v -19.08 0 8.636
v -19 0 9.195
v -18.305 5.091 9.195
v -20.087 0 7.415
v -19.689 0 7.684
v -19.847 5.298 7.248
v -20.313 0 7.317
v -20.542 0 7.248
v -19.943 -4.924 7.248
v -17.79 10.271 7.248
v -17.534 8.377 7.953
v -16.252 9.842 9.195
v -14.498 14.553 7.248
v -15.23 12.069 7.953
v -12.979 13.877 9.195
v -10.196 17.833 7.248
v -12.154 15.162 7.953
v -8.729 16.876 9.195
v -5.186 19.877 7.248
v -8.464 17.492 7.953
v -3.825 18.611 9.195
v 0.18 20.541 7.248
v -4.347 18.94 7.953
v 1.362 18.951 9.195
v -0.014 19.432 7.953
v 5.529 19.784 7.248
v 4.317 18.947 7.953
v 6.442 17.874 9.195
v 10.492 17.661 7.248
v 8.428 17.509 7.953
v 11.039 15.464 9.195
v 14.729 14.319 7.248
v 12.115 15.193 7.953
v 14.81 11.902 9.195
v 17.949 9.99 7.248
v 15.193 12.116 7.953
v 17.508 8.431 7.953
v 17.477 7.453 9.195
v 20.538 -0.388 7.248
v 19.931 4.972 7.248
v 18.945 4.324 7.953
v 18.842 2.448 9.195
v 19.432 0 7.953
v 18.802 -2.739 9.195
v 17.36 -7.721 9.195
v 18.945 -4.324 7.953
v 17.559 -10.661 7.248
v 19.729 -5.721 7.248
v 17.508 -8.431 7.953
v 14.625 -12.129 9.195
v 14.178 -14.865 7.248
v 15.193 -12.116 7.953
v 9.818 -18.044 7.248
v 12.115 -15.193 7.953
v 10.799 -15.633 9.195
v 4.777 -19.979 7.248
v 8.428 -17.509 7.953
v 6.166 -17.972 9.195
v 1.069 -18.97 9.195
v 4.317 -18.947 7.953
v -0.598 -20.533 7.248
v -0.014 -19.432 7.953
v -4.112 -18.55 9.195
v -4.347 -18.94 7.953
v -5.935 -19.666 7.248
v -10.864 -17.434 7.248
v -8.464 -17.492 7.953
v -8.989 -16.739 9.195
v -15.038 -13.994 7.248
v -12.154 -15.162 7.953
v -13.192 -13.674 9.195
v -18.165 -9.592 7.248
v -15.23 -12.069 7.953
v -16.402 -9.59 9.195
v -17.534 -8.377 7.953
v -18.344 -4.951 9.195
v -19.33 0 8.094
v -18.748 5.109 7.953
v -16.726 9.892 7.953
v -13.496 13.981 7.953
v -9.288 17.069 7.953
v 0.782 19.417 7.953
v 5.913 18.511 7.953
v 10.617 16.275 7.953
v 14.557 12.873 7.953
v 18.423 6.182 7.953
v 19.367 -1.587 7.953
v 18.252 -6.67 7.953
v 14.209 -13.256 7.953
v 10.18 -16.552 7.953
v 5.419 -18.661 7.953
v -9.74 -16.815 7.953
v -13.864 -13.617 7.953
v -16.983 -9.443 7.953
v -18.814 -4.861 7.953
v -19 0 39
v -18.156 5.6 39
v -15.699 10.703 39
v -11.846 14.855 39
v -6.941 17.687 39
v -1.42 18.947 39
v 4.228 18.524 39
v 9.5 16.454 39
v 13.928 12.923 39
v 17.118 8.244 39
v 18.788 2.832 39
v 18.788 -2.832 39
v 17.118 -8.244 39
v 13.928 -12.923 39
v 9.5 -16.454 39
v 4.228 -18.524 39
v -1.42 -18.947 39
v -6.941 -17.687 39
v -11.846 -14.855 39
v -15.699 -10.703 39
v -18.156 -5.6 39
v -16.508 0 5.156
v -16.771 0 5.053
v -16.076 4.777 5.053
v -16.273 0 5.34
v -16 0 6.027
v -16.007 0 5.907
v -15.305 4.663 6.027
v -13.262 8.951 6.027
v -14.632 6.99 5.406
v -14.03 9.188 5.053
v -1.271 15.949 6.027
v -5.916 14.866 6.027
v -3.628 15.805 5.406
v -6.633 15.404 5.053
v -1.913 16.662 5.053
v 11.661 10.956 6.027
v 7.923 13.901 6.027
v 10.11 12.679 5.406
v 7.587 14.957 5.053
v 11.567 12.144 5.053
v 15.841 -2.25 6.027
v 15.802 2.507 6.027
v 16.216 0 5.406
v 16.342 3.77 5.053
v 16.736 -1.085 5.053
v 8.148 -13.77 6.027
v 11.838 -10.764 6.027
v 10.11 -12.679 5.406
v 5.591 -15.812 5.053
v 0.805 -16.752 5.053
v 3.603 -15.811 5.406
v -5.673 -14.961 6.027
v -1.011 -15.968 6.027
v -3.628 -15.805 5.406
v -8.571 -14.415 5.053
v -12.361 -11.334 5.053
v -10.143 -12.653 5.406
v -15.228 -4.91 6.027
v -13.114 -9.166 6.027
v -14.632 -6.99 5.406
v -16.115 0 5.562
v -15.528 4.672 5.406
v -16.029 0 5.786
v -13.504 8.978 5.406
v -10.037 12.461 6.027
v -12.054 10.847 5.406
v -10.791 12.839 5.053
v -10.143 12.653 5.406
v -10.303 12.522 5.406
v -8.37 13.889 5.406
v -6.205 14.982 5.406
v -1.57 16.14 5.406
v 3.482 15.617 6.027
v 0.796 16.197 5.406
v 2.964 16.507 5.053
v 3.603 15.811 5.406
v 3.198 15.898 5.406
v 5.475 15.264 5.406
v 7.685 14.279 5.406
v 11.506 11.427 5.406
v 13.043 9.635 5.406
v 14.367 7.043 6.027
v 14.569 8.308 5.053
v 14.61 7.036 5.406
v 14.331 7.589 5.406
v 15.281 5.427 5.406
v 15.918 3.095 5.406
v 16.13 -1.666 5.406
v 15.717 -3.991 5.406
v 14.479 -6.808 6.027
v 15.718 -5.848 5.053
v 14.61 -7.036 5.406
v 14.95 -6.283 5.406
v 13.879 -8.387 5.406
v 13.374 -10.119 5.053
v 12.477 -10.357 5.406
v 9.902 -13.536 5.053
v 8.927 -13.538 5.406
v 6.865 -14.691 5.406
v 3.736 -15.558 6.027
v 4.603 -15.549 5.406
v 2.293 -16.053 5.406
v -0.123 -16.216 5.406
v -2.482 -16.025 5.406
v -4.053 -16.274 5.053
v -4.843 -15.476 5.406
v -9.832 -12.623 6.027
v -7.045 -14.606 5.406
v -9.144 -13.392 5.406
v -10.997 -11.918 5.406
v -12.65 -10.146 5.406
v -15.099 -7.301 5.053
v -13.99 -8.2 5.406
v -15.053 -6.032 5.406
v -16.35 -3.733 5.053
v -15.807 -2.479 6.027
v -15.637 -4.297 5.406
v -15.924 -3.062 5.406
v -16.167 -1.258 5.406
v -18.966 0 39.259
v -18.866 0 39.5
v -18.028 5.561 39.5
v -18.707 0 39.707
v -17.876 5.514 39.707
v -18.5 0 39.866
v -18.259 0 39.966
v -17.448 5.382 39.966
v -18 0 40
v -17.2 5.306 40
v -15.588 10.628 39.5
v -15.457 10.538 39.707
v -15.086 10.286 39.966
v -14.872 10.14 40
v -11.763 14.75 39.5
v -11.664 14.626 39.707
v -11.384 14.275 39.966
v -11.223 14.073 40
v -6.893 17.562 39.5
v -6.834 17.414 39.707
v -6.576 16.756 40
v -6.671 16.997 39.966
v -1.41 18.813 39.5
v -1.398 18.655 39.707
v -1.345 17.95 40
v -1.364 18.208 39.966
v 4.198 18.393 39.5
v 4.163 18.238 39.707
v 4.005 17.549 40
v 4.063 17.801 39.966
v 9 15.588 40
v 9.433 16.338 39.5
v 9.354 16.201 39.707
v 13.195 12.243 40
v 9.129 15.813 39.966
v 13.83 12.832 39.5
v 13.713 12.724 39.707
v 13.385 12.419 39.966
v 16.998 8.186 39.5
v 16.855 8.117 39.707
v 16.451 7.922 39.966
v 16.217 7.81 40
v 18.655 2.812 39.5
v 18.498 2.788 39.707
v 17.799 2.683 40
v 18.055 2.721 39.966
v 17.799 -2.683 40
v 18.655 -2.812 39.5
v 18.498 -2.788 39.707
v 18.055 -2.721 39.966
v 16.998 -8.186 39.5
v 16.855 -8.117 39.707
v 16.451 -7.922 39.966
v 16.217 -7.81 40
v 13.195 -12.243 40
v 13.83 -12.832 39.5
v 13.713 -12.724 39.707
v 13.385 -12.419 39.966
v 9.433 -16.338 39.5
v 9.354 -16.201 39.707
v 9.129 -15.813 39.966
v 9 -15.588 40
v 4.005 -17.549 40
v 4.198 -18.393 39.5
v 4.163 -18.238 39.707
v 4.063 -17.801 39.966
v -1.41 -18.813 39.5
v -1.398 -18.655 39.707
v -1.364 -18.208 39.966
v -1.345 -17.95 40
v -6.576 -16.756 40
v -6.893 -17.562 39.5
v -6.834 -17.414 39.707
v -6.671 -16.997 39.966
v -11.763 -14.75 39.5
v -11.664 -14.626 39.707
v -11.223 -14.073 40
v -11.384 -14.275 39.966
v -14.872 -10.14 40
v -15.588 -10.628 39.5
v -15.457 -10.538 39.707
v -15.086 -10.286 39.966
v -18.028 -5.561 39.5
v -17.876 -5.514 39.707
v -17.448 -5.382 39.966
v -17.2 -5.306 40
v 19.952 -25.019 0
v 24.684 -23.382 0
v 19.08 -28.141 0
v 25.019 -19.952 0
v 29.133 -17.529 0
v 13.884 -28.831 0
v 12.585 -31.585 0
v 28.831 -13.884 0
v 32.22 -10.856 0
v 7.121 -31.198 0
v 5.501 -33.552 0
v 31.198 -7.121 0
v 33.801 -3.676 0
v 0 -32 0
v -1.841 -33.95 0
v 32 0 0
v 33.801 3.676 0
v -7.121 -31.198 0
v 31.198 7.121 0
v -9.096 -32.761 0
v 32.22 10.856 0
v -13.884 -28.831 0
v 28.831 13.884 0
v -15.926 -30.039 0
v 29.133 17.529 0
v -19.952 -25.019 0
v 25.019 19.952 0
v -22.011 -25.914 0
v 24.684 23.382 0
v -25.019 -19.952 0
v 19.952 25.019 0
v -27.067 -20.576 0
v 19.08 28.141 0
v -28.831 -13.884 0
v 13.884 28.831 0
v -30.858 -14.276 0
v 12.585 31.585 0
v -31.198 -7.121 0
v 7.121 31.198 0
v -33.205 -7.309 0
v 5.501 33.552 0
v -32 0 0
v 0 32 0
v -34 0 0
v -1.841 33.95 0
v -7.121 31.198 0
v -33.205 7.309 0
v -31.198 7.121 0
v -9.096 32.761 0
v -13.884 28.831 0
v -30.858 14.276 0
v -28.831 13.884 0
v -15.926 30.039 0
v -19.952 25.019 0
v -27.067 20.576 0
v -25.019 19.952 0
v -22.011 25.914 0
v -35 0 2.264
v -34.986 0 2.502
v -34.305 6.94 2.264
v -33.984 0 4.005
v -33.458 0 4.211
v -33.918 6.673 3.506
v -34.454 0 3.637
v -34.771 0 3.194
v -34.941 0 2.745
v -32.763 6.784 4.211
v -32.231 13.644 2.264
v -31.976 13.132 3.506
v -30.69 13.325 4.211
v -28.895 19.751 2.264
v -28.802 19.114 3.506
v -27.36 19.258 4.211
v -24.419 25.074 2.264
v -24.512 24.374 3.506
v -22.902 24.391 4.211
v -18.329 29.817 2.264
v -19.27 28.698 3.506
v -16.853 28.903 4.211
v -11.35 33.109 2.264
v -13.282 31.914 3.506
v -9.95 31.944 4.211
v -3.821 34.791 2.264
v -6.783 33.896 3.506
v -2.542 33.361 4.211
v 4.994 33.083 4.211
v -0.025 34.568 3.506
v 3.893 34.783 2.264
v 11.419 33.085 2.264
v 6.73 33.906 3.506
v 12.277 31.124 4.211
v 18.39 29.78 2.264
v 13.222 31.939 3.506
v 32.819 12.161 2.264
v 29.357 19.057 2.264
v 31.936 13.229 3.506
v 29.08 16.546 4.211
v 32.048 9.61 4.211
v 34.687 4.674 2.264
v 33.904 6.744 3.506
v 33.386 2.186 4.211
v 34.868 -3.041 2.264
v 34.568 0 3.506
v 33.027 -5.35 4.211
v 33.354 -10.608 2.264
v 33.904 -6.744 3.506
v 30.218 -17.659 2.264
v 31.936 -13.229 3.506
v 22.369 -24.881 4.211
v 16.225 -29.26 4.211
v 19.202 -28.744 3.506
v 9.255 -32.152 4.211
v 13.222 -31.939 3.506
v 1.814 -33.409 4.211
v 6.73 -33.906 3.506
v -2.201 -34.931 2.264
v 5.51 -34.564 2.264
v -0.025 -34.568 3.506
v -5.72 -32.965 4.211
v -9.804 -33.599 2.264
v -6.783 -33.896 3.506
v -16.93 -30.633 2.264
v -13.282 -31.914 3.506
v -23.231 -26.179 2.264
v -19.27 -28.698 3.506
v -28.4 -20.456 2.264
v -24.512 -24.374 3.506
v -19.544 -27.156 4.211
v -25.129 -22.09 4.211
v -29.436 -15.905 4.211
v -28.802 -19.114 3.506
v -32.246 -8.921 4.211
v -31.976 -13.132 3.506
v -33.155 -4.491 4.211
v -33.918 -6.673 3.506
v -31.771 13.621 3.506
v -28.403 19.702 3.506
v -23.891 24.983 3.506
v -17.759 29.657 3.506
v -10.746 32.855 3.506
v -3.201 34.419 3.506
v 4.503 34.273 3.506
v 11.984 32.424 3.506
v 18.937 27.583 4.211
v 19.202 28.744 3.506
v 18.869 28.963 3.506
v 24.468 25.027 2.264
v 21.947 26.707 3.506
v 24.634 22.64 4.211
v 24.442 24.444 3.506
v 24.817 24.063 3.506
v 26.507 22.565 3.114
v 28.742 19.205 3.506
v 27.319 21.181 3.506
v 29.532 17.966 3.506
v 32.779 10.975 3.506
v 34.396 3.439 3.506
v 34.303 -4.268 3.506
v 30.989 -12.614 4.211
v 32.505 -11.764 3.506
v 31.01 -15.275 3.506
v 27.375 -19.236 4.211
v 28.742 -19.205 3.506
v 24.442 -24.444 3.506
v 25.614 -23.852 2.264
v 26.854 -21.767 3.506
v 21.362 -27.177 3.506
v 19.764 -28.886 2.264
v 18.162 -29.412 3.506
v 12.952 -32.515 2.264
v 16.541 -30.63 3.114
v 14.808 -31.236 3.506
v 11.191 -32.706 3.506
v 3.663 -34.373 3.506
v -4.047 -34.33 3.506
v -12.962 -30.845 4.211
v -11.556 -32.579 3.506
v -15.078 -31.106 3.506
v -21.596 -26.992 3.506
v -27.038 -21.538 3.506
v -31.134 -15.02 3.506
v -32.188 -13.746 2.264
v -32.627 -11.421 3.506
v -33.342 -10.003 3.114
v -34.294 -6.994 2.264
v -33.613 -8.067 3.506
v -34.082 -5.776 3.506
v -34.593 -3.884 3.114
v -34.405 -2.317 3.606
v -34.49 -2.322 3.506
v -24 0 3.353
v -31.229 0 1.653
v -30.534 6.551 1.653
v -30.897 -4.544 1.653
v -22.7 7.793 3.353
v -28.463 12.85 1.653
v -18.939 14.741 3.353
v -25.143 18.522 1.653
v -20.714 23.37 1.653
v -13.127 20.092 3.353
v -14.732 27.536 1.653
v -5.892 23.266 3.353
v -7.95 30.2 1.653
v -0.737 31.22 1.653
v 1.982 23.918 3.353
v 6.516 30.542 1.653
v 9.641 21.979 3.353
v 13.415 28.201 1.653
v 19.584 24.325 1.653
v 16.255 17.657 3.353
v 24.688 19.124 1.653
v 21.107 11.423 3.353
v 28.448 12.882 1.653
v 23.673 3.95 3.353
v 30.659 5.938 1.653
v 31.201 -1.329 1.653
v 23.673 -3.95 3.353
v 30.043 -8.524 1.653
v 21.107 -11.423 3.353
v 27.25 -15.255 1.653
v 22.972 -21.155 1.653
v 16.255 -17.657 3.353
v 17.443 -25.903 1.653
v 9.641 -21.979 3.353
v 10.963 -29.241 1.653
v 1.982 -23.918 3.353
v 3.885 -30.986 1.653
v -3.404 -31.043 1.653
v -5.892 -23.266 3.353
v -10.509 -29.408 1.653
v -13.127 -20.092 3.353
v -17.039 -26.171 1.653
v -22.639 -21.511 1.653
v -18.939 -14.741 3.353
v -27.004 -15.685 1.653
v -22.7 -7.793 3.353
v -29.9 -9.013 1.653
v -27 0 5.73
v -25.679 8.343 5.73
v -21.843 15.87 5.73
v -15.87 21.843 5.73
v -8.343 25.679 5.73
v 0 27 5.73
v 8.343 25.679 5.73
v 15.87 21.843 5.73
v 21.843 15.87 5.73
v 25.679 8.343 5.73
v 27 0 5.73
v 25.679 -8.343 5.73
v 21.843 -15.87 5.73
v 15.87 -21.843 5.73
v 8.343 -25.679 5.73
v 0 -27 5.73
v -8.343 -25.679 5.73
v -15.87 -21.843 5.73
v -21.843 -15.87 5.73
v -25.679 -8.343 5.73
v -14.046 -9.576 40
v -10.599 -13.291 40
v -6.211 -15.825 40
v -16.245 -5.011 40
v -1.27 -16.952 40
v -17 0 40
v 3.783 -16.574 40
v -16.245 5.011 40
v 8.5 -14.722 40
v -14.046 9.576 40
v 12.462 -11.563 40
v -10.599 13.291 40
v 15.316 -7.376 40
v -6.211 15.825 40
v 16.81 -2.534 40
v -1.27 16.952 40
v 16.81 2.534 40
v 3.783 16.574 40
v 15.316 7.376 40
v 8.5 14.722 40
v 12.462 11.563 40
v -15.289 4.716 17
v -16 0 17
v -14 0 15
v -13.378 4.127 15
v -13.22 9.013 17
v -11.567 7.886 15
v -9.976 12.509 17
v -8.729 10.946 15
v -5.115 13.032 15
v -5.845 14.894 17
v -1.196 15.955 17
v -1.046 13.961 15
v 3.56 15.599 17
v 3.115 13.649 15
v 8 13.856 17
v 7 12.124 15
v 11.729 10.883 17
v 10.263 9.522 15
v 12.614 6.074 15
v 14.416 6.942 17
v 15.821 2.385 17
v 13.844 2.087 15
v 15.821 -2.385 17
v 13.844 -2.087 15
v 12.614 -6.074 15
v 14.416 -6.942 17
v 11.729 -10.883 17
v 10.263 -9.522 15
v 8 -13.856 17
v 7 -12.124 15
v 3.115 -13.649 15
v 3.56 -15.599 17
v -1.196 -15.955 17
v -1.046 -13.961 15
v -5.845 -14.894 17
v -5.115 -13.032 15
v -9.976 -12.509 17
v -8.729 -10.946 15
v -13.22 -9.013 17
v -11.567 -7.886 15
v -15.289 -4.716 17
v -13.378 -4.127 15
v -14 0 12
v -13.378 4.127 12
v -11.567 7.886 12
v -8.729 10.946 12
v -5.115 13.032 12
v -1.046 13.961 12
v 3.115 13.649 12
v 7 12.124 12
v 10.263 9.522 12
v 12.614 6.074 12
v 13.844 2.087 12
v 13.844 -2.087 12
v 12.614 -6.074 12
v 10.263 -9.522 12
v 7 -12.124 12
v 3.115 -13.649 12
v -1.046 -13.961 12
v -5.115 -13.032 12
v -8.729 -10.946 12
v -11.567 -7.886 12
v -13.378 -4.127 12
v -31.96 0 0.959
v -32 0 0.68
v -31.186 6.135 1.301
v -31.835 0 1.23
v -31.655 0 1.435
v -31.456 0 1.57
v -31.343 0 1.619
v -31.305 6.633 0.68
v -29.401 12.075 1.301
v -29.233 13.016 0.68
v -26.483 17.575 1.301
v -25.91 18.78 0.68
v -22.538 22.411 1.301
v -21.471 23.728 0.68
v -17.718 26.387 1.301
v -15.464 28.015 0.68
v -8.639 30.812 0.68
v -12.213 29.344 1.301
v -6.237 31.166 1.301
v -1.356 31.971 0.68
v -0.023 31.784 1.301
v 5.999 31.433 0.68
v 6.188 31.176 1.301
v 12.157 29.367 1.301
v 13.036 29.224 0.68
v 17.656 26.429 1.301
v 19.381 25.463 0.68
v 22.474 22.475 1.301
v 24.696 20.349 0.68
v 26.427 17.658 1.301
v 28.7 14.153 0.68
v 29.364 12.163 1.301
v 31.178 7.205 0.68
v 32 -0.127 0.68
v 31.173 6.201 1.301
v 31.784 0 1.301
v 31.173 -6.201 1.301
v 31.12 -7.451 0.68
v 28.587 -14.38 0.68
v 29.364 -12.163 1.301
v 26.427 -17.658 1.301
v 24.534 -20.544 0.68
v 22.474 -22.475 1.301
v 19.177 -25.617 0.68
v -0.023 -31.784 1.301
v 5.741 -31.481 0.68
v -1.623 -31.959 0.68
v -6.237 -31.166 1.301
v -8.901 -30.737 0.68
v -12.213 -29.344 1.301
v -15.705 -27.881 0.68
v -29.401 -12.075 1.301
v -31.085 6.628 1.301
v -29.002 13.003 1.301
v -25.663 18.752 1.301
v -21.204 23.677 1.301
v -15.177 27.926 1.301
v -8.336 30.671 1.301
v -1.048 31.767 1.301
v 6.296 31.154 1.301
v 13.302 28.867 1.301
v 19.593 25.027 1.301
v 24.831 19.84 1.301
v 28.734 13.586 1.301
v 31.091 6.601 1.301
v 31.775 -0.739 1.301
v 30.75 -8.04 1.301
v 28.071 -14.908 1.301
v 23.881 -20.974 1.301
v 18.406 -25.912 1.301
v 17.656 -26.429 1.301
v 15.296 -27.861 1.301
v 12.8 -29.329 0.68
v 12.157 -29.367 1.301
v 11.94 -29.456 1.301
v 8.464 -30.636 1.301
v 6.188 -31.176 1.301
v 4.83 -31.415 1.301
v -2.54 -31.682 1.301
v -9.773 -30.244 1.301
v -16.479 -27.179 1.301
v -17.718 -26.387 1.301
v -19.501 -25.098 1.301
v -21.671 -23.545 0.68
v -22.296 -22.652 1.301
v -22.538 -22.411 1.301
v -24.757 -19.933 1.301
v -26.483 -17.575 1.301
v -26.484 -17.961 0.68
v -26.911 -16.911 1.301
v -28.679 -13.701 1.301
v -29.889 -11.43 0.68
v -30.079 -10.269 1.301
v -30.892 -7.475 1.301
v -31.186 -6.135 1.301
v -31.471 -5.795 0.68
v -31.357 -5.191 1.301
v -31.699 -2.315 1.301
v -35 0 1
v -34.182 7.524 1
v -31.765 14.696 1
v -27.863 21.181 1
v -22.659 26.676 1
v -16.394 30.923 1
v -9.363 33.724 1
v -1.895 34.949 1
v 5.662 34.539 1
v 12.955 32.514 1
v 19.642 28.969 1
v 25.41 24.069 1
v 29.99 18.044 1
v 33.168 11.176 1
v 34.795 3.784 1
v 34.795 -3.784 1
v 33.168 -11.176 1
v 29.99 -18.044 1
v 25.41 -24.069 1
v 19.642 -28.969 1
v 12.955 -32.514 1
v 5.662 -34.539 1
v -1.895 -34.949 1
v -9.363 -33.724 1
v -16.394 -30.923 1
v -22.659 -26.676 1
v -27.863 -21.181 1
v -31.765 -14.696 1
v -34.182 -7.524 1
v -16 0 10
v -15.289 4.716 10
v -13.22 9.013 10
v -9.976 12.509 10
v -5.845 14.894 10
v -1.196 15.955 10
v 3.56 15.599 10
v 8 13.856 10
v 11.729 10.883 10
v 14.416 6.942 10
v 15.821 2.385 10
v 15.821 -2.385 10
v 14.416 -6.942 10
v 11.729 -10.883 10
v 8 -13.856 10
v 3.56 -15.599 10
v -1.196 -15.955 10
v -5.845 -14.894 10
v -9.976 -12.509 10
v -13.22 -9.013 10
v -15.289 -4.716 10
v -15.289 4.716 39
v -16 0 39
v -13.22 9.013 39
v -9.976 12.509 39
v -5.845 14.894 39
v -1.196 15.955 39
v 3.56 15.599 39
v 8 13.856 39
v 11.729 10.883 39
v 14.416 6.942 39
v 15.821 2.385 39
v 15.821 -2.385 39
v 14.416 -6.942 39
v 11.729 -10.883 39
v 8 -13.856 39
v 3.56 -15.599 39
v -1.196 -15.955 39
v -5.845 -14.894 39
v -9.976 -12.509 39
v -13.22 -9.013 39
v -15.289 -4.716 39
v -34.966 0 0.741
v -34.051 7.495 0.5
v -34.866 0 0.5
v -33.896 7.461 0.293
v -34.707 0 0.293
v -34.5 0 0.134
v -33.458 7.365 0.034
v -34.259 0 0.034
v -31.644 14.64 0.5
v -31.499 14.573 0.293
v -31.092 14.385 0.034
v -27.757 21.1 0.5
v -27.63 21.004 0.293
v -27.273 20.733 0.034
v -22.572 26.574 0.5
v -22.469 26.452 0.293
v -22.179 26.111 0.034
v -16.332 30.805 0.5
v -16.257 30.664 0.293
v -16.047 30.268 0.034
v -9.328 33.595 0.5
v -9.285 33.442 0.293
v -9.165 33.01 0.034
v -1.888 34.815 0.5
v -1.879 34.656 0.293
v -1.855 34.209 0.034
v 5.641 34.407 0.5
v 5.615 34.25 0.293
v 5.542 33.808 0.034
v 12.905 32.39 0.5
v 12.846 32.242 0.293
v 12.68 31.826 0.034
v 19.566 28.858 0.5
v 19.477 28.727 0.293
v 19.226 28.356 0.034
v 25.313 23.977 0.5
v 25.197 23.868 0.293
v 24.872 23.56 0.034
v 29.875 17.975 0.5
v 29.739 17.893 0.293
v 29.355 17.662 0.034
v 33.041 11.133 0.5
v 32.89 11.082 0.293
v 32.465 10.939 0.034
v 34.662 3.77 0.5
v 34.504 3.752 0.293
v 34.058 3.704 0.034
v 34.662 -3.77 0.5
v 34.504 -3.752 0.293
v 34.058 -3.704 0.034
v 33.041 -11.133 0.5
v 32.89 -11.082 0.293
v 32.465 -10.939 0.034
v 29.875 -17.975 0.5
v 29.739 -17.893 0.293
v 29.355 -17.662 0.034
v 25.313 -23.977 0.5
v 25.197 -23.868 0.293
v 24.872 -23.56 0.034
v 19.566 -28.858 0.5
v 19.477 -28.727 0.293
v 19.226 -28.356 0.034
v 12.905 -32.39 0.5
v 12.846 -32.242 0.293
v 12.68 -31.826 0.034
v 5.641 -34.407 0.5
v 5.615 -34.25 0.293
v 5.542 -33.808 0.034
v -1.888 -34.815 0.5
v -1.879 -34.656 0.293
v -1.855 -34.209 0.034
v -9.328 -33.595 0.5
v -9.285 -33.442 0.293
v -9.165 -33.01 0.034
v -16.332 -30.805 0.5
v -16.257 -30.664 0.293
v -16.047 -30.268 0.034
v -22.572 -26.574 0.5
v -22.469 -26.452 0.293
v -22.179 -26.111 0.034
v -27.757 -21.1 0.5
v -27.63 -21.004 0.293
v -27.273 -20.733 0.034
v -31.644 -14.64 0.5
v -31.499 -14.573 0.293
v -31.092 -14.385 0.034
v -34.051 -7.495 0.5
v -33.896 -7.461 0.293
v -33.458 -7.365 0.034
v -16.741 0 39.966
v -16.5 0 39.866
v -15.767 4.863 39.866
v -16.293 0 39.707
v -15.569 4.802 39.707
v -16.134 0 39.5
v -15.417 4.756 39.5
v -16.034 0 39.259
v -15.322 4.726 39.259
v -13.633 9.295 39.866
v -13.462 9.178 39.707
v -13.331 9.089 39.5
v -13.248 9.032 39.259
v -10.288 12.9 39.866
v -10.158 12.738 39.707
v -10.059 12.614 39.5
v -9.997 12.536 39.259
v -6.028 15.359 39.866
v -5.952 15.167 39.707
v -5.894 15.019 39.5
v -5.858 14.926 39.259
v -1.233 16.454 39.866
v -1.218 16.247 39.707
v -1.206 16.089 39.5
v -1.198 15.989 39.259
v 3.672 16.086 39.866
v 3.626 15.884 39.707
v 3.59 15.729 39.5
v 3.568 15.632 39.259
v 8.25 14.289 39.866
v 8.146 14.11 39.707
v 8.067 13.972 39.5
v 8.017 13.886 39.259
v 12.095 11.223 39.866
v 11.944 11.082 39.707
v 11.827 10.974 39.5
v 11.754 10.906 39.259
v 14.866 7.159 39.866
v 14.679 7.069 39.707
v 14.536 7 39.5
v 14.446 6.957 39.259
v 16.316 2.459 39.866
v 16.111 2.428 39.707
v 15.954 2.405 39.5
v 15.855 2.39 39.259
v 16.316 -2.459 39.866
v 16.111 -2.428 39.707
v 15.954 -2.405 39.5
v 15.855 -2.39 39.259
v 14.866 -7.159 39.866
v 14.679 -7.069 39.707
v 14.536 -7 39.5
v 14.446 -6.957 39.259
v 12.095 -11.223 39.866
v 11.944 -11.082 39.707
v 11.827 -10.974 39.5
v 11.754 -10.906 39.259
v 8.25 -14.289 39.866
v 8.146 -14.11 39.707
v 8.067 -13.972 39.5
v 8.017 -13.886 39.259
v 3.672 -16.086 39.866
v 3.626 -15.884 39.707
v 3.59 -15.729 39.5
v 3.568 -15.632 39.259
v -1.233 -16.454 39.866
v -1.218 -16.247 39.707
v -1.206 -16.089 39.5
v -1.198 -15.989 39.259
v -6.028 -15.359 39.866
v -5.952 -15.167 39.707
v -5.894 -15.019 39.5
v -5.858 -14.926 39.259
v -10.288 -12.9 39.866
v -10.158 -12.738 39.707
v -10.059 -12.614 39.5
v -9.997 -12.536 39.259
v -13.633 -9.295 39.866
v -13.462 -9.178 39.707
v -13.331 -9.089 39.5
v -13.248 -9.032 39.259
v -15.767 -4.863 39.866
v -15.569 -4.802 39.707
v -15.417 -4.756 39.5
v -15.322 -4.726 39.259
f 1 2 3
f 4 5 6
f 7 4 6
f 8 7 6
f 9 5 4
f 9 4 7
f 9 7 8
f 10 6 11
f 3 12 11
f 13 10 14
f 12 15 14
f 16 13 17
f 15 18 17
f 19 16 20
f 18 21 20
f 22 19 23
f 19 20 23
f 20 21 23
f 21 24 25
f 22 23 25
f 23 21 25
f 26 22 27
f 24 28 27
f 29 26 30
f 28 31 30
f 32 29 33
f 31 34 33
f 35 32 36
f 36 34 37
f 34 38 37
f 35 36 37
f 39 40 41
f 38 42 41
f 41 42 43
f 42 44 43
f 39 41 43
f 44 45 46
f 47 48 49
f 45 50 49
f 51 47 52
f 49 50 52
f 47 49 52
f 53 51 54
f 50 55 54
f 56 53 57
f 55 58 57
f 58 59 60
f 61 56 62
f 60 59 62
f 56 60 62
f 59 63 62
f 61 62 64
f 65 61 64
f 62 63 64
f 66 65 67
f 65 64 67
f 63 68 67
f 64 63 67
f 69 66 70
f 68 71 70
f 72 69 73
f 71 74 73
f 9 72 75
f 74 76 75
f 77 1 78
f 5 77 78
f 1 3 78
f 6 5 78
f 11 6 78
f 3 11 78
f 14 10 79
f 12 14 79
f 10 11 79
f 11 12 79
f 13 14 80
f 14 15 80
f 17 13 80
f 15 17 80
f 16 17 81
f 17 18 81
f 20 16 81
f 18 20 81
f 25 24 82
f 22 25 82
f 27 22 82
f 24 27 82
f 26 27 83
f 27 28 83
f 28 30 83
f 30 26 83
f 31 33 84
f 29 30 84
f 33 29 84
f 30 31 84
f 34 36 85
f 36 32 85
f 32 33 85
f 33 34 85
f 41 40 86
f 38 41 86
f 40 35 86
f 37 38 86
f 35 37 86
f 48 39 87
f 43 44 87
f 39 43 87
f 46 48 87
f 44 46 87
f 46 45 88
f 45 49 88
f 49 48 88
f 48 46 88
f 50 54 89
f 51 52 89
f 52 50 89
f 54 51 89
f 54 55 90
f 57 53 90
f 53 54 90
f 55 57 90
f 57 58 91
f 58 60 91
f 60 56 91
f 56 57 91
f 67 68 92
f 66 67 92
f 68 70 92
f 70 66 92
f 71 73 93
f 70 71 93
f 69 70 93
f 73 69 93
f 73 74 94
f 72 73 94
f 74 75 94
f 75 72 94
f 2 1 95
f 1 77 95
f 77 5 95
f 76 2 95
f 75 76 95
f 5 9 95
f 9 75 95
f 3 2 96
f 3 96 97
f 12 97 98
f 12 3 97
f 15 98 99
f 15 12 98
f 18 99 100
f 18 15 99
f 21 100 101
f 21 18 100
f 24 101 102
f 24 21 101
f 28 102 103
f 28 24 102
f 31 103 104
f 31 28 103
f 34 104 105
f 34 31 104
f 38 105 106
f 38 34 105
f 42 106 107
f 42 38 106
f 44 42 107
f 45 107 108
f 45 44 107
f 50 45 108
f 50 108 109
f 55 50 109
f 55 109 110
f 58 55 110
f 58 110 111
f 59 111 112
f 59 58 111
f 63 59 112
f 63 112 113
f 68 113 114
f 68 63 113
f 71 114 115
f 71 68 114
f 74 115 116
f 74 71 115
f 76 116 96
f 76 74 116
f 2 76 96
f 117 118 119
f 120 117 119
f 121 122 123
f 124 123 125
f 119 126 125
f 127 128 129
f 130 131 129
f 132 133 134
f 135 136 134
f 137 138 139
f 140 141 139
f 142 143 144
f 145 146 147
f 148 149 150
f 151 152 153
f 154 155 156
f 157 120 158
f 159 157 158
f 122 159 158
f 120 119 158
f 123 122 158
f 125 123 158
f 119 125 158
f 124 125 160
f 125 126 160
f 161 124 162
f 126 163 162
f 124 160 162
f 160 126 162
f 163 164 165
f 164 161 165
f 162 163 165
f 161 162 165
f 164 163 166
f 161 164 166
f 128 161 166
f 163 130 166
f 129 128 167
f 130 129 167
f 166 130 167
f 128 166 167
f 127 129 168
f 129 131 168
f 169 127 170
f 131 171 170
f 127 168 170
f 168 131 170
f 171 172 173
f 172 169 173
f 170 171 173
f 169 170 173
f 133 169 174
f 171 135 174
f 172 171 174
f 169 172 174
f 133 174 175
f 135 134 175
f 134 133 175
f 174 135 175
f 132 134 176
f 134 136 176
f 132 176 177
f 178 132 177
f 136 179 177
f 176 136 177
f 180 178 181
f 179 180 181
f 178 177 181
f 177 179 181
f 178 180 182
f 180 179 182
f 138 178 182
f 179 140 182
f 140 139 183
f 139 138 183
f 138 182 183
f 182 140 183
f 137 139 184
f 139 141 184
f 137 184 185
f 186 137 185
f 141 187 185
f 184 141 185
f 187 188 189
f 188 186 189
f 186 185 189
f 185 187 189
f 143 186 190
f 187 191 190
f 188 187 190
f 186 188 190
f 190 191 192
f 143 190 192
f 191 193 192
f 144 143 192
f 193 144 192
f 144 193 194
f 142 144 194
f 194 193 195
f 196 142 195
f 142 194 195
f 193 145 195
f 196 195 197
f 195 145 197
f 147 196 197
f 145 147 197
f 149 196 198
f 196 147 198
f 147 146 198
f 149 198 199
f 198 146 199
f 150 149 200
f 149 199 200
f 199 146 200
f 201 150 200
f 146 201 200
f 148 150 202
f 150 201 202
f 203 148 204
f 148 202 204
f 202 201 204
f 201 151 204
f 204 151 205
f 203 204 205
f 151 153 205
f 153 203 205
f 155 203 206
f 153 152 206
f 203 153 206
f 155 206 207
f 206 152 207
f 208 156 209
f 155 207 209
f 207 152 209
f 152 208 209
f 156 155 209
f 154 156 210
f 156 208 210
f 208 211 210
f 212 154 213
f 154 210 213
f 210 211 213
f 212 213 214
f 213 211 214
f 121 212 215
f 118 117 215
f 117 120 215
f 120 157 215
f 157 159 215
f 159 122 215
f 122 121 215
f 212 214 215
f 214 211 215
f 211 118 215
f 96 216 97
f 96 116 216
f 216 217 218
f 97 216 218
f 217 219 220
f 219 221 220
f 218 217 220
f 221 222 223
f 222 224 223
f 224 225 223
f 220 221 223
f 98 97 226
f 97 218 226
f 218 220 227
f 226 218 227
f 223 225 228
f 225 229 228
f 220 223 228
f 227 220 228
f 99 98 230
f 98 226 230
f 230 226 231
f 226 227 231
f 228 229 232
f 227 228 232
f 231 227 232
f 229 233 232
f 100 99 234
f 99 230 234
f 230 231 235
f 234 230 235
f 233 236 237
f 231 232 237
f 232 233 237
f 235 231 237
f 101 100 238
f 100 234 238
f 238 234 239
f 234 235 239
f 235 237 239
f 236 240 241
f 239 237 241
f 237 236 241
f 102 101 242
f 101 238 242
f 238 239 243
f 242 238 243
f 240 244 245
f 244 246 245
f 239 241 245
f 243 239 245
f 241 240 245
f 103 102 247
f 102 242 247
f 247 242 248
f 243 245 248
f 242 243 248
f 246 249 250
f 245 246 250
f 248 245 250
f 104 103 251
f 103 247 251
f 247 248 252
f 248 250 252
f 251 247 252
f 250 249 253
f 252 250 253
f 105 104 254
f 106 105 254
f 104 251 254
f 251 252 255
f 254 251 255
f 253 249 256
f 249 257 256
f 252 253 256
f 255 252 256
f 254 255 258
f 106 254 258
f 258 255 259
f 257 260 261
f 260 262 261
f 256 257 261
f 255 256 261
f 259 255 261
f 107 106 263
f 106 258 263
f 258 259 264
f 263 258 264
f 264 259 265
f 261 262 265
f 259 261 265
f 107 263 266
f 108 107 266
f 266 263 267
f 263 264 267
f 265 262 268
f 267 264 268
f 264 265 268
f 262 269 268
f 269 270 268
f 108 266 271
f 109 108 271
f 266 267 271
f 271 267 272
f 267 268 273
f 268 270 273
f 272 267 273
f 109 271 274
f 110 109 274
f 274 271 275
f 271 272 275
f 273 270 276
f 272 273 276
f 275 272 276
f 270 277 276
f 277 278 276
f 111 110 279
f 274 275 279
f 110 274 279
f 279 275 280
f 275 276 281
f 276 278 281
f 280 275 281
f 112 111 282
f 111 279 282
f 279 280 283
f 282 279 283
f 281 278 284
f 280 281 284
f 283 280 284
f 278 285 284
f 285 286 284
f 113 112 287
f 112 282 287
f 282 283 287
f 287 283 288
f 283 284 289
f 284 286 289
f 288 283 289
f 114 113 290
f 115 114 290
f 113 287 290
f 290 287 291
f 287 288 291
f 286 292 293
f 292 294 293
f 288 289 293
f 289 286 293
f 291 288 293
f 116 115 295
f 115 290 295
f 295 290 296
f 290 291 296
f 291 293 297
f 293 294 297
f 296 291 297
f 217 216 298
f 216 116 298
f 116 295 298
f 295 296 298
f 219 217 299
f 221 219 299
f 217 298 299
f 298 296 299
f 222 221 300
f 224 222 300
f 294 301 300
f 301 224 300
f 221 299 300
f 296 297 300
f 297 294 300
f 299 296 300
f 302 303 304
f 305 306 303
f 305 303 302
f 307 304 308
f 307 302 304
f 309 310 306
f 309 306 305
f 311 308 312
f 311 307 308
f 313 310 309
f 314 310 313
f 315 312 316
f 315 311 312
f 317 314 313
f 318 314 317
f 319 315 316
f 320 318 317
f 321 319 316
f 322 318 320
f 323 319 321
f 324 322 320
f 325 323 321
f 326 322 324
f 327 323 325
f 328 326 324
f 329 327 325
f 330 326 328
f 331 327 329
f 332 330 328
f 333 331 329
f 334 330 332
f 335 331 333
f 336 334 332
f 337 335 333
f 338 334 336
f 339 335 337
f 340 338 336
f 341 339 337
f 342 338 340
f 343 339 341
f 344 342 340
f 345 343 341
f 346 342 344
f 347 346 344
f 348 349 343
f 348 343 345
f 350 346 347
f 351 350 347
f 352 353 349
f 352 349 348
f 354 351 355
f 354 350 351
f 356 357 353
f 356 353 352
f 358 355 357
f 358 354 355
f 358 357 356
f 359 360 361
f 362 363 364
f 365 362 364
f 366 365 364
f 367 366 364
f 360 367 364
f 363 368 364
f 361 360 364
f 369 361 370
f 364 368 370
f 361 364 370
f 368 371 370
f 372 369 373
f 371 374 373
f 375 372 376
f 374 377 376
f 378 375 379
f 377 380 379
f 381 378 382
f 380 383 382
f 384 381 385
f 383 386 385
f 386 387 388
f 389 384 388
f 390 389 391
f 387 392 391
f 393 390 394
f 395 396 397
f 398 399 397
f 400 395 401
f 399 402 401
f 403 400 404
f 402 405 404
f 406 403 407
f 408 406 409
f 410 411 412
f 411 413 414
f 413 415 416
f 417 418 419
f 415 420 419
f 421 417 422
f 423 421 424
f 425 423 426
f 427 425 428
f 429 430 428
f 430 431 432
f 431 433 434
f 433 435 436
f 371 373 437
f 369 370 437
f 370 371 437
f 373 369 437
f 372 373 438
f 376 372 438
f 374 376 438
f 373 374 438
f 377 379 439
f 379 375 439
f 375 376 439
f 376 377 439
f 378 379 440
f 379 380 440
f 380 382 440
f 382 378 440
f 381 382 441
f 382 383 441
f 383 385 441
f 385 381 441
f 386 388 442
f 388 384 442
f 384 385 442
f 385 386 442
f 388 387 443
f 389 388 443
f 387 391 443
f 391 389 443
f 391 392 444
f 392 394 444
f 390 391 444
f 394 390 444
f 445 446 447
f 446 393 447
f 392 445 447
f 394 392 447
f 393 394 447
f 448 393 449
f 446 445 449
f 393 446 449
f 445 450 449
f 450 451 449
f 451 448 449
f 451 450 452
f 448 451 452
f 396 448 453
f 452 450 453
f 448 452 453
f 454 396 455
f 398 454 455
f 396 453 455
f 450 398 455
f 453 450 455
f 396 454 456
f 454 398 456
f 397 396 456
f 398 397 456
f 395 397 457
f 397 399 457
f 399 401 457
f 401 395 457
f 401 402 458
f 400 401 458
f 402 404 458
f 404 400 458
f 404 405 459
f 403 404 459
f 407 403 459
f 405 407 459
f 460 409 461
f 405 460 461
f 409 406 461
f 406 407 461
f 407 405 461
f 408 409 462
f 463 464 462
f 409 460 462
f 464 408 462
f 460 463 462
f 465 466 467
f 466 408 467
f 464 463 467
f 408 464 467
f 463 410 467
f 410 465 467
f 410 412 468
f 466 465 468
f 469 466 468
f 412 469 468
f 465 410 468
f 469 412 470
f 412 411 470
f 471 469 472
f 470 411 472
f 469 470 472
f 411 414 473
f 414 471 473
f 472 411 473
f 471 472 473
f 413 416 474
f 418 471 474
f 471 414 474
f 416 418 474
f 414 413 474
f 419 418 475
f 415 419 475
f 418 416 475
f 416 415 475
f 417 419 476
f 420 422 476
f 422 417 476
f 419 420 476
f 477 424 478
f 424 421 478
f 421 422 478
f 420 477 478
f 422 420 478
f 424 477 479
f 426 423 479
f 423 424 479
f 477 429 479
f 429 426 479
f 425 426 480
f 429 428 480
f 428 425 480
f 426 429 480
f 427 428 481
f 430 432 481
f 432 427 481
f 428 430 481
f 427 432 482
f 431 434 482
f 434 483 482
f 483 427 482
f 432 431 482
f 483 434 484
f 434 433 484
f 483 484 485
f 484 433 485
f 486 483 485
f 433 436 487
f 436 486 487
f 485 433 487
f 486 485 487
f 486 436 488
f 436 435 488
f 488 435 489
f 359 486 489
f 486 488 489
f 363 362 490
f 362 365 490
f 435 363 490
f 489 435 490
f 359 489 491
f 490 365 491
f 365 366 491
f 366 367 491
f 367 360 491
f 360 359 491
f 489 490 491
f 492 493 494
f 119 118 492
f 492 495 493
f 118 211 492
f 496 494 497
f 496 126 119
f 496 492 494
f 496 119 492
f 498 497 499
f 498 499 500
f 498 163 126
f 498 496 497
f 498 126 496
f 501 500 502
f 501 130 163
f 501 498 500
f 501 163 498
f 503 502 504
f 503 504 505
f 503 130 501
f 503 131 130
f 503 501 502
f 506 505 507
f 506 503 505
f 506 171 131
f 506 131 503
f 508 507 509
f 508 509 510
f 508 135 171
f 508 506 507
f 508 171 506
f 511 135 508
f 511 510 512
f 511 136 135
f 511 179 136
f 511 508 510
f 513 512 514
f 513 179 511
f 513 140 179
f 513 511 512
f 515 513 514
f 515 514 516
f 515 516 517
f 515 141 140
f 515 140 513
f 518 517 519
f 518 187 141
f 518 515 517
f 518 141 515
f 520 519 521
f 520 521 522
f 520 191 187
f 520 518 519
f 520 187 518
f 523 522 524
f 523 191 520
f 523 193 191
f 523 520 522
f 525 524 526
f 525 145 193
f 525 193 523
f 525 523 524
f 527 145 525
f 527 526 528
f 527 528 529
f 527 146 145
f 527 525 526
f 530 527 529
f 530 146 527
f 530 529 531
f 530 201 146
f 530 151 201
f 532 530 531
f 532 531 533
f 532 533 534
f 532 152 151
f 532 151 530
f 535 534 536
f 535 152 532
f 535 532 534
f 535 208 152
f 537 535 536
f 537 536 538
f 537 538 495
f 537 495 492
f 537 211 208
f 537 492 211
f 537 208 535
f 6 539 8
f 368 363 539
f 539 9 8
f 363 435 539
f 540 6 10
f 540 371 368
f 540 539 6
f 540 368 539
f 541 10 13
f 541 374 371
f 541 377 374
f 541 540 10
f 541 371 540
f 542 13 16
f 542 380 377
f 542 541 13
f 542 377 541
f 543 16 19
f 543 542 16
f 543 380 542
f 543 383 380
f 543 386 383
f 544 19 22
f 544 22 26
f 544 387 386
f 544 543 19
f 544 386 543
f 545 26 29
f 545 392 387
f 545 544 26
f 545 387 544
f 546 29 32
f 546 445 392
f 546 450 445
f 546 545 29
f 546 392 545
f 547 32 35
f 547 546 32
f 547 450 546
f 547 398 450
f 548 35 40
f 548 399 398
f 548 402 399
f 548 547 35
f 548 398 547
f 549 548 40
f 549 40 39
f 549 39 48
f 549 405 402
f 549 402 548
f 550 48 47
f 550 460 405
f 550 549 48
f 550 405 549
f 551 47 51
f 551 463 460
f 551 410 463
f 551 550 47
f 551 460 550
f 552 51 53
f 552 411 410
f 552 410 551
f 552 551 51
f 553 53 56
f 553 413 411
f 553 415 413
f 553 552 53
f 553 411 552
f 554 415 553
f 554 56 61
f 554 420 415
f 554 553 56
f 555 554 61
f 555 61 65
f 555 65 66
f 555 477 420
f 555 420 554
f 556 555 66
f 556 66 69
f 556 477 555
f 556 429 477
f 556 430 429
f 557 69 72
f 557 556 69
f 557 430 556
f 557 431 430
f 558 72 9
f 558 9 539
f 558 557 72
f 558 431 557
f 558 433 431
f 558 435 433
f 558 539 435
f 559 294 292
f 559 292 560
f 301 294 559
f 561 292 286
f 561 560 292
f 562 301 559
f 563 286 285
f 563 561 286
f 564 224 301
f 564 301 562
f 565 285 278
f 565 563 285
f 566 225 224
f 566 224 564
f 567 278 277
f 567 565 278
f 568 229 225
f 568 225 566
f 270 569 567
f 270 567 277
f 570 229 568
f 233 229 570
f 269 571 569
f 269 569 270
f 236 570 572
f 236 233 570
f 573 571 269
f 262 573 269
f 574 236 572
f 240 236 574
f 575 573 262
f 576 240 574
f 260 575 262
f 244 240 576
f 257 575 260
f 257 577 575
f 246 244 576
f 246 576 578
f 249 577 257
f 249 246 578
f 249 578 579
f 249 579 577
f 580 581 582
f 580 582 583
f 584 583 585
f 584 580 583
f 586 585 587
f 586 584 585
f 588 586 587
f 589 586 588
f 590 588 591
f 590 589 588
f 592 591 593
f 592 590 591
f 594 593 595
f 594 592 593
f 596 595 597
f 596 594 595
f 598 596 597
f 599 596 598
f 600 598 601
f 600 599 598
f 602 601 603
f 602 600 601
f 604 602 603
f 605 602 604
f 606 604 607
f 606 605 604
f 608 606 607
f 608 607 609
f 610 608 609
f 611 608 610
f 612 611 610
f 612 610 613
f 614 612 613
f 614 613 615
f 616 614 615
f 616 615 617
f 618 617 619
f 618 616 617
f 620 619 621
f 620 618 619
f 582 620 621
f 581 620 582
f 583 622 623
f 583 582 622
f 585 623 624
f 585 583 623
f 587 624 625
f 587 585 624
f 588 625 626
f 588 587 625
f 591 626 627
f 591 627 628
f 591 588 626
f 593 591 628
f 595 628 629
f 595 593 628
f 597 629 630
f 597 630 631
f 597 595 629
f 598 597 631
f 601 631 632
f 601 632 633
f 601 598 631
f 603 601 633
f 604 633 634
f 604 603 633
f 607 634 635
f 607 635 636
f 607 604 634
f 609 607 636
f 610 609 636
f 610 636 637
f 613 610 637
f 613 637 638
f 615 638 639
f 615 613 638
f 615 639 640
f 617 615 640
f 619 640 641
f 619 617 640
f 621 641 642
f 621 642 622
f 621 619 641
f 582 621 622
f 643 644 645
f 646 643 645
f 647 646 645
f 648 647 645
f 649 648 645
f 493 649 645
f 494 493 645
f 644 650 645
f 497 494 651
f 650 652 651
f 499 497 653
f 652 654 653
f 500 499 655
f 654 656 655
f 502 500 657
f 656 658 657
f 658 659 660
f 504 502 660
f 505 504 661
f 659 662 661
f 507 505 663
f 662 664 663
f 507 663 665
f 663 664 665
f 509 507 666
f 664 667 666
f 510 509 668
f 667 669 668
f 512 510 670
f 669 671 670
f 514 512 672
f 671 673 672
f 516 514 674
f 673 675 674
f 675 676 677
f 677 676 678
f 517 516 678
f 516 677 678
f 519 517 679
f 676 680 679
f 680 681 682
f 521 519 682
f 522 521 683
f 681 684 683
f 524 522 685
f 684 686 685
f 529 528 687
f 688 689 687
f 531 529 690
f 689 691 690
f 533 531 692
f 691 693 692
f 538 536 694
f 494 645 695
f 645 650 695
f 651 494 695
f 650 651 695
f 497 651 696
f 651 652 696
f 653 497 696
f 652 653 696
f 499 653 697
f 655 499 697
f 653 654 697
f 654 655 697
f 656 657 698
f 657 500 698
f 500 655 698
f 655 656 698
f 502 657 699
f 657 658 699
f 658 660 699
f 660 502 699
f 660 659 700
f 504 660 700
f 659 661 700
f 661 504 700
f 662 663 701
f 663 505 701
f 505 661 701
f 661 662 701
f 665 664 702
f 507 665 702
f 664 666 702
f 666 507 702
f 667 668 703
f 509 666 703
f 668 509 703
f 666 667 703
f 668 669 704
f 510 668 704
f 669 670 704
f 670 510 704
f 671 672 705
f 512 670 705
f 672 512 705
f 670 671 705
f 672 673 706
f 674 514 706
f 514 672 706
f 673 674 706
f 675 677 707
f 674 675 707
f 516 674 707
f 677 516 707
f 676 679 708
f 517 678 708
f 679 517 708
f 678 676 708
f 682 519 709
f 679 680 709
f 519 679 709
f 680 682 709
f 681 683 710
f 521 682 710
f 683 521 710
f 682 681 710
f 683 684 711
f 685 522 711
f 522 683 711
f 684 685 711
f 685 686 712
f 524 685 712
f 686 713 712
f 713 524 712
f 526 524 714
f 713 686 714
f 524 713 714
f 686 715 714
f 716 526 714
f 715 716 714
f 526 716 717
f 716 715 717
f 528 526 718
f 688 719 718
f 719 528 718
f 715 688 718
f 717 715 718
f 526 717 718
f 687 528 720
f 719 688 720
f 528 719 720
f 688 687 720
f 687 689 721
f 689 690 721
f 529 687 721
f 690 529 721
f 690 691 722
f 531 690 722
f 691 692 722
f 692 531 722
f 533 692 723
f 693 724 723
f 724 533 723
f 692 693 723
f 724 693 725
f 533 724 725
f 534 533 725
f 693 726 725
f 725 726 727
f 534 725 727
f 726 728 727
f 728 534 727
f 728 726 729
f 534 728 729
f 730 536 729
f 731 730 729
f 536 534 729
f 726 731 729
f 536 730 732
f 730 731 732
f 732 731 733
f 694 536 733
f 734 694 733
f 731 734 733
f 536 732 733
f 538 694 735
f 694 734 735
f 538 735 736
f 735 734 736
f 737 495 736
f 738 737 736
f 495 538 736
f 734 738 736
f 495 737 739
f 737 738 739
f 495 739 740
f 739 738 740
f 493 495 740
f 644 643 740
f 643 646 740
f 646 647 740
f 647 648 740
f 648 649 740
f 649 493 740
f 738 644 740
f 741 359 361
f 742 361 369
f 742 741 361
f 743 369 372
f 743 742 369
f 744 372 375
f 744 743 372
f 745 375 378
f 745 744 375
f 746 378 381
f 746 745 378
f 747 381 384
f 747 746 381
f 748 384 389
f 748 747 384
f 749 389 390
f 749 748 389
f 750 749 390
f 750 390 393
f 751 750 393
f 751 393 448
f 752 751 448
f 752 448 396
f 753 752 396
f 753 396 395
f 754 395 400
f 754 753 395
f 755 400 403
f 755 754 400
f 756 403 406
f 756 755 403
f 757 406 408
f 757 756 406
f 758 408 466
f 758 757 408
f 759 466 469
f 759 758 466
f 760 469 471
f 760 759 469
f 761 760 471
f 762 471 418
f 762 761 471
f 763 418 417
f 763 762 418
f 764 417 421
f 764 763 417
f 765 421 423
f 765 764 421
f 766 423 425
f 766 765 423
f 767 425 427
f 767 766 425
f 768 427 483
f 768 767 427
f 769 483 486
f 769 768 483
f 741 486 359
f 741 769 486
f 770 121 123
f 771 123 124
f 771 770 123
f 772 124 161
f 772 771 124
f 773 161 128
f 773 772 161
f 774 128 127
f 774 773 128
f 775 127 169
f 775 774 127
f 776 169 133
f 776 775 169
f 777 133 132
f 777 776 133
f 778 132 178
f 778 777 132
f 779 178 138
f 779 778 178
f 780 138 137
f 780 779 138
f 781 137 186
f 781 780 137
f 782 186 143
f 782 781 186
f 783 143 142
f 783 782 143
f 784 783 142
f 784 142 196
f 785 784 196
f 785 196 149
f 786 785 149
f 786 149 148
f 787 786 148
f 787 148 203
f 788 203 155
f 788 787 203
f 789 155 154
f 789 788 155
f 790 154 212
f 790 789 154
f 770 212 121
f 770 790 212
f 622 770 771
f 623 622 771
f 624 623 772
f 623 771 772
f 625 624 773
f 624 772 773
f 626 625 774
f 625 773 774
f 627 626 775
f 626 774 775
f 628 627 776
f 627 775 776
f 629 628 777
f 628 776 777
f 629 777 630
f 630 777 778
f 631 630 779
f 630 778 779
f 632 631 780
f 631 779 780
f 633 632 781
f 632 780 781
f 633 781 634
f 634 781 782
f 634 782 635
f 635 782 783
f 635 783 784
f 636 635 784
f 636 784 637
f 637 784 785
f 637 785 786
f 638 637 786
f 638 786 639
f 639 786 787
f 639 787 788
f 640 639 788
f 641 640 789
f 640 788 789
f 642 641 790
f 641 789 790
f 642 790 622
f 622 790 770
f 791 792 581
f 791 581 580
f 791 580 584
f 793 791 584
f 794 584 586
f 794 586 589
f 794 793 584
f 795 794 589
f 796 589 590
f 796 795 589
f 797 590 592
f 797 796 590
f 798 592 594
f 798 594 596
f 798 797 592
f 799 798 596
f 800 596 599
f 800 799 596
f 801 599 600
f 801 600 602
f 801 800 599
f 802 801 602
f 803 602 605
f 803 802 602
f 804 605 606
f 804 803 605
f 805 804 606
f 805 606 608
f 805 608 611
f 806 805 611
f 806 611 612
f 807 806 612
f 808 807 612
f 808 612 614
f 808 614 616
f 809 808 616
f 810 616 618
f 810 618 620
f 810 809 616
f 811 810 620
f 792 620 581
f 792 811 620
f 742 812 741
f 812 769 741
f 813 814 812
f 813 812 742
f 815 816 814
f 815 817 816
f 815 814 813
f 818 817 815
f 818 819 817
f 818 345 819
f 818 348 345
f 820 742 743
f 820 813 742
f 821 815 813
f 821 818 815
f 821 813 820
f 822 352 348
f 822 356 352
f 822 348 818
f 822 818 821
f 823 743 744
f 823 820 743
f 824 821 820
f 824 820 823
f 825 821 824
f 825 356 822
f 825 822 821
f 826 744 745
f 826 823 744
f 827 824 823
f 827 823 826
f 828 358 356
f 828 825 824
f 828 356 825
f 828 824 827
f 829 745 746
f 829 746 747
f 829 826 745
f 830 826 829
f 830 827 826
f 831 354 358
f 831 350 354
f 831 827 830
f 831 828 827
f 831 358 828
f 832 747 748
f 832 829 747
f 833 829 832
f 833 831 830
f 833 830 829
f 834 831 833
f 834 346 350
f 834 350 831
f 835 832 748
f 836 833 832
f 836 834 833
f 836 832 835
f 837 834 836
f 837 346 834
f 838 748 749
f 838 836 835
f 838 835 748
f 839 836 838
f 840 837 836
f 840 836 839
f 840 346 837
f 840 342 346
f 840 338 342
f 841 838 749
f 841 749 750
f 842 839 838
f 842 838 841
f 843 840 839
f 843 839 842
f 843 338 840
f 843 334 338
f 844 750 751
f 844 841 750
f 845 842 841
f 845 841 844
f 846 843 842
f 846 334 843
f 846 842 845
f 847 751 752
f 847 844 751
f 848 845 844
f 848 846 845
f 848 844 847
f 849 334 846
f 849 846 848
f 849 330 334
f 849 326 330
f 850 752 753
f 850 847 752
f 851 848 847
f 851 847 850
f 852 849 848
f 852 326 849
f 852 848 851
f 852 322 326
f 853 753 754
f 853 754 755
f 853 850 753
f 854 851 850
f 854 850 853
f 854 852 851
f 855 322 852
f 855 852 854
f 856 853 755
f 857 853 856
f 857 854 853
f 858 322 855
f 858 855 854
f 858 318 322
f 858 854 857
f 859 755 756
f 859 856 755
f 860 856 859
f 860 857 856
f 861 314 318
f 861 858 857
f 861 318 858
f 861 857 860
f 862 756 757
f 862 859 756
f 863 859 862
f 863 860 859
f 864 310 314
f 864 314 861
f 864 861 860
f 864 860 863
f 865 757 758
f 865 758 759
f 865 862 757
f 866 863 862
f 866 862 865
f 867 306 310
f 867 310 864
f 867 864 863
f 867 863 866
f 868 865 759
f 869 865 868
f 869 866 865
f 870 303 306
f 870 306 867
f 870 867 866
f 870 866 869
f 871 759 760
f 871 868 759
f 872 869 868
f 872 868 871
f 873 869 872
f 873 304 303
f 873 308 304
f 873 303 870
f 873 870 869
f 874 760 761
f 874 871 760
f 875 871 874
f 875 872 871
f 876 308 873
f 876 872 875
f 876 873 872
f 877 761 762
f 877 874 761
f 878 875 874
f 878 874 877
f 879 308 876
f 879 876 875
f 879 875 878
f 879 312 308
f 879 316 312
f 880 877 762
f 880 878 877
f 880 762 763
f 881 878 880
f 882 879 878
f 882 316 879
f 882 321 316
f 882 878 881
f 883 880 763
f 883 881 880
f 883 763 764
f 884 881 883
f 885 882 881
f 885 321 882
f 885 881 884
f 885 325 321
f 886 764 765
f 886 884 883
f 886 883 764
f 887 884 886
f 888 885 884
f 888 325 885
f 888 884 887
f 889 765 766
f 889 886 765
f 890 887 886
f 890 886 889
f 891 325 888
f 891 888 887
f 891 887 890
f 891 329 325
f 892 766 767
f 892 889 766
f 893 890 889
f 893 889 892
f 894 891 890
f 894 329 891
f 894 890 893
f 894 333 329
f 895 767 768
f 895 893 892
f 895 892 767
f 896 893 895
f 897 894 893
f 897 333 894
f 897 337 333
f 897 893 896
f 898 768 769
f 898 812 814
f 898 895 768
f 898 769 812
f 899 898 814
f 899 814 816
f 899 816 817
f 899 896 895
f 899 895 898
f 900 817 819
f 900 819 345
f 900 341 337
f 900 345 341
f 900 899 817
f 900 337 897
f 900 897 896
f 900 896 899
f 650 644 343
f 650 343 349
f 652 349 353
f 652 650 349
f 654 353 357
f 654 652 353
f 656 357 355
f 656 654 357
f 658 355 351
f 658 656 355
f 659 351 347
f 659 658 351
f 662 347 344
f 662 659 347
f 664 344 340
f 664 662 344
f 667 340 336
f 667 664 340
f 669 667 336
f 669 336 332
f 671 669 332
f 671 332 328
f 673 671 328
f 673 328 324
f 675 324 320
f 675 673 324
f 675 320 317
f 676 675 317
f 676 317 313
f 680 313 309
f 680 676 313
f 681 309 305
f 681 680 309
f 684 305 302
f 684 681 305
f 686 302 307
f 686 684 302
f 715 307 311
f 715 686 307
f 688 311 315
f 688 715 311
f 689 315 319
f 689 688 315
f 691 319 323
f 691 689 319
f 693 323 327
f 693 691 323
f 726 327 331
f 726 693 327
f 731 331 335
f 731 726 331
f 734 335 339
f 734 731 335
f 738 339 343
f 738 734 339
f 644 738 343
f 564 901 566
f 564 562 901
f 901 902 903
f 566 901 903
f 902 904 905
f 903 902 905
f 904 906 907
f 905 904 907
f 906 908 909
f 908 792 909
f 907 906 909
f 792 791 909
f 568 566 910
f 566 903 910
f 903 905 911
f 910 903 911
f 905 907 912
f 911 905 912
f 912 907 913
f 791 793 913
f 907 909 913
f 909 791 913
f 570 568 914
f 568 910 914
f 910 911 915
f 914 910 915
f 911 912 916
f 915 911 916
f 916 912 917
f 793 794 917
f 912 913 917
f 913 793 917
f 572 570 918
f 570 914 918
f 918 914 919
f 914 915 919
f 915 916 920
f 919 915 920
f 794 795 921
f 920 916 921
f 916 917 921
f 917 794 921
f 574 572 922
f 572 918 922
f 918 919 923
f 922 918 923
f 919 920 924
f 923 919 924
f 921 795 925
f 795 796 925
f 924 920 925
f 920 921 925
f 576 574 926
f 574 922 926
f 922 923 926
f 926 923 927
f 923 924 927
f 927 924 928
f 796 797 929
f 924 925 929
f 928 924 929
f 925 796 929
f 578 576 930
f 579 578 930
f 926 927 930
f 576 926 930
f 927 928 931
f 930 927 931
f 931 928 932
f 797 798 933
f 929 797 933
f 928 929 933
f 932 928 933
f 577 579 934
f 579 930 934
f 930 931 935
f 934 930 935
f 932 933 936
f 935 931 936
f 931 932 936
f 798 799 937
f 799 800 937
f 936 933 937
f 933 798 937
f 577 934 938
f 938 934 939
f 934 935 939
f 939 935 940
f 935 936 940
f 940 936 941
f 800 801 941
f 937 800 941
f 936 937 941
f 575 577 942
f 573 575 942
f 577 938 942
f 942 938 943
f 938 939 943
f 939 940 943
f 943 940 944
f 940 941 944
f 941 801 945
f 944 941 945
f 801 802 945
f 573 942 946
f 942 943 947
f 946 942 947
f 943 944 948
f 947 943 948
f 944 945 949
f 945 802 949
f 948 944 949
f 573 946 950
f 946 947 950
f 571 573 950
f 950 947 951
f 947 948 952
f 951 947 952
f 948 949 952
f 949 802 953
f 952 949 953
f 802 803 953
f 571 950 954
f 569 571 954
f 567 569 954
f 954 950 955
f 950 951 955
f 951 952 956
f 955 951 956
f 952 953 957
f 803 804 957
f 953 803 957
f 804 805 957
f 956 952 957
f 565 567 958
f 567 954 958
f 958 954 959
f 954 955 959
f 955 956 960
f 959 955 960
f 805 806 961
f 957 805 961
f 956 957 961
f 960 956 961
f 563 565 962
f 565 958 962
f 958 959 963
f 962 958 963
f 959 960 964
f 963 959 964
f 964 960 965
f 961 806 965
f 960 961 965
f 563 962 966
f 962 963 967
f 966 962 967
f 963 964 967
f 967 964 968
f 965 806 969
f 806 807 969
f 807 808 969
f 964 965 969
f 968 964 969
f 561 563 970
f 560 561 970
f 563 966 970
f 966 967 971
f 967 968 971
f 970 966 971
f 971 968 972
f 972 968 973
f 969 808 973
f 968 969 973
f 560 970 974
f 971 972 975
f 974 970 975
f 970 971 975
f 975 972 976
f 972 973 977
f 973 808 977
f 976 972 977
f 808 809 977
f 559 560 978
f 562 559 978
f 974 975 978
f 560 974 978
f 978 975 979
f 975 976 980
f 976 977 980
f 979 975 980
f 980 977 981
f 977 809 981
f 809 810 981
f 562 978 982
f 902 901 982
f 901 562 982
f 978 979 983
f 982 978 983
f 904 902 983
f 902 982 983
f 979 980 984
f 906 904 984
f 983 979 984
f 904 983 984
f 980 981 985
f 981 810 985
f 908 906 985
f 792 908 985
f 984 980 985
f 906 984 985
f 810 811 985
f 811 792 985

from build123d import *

# Parameters (mm, degrees)
F2_SIZE = 1.99999
F3_R    = 2
F4_R    = 1
F5_SIZE = 1.99999


# Not quite as in the source:
# - a fillet or chamfer is up to 0.001 mm smaller than in the source, because OpenCascade refuses the exact size


with BuildPart() as f1:
    # F0 (on Front) → F1 (revolve)
    with BuildSketch(Plane.XZ):
        Polygon((-35, 0), (-32, 0), (-32, 1.4718503955), (-16, 5.2344552971), (-16, 12), (-14, 12), (-14, 15), (-16, 15), (-16, 40), (-19, 40), (-19, 7.6108030044), (-35, 3.8481981028), align=None)
    revolve(axis=Axis((0, 0, 9.703790769), (0, 0, -1)))

    # F2 (size 2 in the source; OpenCascade refuses exactly that, so slightly less here)
    f2_edges = [f1.edges().sort_by_distance(p)[0] for p in [
        (16, 0, 15),
    ]]
    chamfer(f2_edges, length=F2_SIZE)

    # F3
    f3_edges = [f1.edges().sort_by_distance(p)[0] for p in [
        (35, 0, 3.848198),
        (19, 0, 7.610803),
    ]]
    fillet(f3_edges, radius=F3_R)

    # F4
    f4_edges = [f1.edges().sort_by_distance(p)[0] for p in [
        (32, 0, 1.47185),
        (16, 0, 5.234455),
        (35, 0, 0),
        (19, 0, 40),
        (16, 0, 40),
    ]]
    fillet(f4_edges, radius=F4_R)

    # F5 (size 2 in the source; OpenCascade refuses exactly that, so slightly less here)
    f5_edges = [f1.edges().sort_by_distance(p)[0] for p in [
        (16, 0, 12),
    ]]
    chamfer(f5_edges, length=F5_SIZE)


solid = f1.part
